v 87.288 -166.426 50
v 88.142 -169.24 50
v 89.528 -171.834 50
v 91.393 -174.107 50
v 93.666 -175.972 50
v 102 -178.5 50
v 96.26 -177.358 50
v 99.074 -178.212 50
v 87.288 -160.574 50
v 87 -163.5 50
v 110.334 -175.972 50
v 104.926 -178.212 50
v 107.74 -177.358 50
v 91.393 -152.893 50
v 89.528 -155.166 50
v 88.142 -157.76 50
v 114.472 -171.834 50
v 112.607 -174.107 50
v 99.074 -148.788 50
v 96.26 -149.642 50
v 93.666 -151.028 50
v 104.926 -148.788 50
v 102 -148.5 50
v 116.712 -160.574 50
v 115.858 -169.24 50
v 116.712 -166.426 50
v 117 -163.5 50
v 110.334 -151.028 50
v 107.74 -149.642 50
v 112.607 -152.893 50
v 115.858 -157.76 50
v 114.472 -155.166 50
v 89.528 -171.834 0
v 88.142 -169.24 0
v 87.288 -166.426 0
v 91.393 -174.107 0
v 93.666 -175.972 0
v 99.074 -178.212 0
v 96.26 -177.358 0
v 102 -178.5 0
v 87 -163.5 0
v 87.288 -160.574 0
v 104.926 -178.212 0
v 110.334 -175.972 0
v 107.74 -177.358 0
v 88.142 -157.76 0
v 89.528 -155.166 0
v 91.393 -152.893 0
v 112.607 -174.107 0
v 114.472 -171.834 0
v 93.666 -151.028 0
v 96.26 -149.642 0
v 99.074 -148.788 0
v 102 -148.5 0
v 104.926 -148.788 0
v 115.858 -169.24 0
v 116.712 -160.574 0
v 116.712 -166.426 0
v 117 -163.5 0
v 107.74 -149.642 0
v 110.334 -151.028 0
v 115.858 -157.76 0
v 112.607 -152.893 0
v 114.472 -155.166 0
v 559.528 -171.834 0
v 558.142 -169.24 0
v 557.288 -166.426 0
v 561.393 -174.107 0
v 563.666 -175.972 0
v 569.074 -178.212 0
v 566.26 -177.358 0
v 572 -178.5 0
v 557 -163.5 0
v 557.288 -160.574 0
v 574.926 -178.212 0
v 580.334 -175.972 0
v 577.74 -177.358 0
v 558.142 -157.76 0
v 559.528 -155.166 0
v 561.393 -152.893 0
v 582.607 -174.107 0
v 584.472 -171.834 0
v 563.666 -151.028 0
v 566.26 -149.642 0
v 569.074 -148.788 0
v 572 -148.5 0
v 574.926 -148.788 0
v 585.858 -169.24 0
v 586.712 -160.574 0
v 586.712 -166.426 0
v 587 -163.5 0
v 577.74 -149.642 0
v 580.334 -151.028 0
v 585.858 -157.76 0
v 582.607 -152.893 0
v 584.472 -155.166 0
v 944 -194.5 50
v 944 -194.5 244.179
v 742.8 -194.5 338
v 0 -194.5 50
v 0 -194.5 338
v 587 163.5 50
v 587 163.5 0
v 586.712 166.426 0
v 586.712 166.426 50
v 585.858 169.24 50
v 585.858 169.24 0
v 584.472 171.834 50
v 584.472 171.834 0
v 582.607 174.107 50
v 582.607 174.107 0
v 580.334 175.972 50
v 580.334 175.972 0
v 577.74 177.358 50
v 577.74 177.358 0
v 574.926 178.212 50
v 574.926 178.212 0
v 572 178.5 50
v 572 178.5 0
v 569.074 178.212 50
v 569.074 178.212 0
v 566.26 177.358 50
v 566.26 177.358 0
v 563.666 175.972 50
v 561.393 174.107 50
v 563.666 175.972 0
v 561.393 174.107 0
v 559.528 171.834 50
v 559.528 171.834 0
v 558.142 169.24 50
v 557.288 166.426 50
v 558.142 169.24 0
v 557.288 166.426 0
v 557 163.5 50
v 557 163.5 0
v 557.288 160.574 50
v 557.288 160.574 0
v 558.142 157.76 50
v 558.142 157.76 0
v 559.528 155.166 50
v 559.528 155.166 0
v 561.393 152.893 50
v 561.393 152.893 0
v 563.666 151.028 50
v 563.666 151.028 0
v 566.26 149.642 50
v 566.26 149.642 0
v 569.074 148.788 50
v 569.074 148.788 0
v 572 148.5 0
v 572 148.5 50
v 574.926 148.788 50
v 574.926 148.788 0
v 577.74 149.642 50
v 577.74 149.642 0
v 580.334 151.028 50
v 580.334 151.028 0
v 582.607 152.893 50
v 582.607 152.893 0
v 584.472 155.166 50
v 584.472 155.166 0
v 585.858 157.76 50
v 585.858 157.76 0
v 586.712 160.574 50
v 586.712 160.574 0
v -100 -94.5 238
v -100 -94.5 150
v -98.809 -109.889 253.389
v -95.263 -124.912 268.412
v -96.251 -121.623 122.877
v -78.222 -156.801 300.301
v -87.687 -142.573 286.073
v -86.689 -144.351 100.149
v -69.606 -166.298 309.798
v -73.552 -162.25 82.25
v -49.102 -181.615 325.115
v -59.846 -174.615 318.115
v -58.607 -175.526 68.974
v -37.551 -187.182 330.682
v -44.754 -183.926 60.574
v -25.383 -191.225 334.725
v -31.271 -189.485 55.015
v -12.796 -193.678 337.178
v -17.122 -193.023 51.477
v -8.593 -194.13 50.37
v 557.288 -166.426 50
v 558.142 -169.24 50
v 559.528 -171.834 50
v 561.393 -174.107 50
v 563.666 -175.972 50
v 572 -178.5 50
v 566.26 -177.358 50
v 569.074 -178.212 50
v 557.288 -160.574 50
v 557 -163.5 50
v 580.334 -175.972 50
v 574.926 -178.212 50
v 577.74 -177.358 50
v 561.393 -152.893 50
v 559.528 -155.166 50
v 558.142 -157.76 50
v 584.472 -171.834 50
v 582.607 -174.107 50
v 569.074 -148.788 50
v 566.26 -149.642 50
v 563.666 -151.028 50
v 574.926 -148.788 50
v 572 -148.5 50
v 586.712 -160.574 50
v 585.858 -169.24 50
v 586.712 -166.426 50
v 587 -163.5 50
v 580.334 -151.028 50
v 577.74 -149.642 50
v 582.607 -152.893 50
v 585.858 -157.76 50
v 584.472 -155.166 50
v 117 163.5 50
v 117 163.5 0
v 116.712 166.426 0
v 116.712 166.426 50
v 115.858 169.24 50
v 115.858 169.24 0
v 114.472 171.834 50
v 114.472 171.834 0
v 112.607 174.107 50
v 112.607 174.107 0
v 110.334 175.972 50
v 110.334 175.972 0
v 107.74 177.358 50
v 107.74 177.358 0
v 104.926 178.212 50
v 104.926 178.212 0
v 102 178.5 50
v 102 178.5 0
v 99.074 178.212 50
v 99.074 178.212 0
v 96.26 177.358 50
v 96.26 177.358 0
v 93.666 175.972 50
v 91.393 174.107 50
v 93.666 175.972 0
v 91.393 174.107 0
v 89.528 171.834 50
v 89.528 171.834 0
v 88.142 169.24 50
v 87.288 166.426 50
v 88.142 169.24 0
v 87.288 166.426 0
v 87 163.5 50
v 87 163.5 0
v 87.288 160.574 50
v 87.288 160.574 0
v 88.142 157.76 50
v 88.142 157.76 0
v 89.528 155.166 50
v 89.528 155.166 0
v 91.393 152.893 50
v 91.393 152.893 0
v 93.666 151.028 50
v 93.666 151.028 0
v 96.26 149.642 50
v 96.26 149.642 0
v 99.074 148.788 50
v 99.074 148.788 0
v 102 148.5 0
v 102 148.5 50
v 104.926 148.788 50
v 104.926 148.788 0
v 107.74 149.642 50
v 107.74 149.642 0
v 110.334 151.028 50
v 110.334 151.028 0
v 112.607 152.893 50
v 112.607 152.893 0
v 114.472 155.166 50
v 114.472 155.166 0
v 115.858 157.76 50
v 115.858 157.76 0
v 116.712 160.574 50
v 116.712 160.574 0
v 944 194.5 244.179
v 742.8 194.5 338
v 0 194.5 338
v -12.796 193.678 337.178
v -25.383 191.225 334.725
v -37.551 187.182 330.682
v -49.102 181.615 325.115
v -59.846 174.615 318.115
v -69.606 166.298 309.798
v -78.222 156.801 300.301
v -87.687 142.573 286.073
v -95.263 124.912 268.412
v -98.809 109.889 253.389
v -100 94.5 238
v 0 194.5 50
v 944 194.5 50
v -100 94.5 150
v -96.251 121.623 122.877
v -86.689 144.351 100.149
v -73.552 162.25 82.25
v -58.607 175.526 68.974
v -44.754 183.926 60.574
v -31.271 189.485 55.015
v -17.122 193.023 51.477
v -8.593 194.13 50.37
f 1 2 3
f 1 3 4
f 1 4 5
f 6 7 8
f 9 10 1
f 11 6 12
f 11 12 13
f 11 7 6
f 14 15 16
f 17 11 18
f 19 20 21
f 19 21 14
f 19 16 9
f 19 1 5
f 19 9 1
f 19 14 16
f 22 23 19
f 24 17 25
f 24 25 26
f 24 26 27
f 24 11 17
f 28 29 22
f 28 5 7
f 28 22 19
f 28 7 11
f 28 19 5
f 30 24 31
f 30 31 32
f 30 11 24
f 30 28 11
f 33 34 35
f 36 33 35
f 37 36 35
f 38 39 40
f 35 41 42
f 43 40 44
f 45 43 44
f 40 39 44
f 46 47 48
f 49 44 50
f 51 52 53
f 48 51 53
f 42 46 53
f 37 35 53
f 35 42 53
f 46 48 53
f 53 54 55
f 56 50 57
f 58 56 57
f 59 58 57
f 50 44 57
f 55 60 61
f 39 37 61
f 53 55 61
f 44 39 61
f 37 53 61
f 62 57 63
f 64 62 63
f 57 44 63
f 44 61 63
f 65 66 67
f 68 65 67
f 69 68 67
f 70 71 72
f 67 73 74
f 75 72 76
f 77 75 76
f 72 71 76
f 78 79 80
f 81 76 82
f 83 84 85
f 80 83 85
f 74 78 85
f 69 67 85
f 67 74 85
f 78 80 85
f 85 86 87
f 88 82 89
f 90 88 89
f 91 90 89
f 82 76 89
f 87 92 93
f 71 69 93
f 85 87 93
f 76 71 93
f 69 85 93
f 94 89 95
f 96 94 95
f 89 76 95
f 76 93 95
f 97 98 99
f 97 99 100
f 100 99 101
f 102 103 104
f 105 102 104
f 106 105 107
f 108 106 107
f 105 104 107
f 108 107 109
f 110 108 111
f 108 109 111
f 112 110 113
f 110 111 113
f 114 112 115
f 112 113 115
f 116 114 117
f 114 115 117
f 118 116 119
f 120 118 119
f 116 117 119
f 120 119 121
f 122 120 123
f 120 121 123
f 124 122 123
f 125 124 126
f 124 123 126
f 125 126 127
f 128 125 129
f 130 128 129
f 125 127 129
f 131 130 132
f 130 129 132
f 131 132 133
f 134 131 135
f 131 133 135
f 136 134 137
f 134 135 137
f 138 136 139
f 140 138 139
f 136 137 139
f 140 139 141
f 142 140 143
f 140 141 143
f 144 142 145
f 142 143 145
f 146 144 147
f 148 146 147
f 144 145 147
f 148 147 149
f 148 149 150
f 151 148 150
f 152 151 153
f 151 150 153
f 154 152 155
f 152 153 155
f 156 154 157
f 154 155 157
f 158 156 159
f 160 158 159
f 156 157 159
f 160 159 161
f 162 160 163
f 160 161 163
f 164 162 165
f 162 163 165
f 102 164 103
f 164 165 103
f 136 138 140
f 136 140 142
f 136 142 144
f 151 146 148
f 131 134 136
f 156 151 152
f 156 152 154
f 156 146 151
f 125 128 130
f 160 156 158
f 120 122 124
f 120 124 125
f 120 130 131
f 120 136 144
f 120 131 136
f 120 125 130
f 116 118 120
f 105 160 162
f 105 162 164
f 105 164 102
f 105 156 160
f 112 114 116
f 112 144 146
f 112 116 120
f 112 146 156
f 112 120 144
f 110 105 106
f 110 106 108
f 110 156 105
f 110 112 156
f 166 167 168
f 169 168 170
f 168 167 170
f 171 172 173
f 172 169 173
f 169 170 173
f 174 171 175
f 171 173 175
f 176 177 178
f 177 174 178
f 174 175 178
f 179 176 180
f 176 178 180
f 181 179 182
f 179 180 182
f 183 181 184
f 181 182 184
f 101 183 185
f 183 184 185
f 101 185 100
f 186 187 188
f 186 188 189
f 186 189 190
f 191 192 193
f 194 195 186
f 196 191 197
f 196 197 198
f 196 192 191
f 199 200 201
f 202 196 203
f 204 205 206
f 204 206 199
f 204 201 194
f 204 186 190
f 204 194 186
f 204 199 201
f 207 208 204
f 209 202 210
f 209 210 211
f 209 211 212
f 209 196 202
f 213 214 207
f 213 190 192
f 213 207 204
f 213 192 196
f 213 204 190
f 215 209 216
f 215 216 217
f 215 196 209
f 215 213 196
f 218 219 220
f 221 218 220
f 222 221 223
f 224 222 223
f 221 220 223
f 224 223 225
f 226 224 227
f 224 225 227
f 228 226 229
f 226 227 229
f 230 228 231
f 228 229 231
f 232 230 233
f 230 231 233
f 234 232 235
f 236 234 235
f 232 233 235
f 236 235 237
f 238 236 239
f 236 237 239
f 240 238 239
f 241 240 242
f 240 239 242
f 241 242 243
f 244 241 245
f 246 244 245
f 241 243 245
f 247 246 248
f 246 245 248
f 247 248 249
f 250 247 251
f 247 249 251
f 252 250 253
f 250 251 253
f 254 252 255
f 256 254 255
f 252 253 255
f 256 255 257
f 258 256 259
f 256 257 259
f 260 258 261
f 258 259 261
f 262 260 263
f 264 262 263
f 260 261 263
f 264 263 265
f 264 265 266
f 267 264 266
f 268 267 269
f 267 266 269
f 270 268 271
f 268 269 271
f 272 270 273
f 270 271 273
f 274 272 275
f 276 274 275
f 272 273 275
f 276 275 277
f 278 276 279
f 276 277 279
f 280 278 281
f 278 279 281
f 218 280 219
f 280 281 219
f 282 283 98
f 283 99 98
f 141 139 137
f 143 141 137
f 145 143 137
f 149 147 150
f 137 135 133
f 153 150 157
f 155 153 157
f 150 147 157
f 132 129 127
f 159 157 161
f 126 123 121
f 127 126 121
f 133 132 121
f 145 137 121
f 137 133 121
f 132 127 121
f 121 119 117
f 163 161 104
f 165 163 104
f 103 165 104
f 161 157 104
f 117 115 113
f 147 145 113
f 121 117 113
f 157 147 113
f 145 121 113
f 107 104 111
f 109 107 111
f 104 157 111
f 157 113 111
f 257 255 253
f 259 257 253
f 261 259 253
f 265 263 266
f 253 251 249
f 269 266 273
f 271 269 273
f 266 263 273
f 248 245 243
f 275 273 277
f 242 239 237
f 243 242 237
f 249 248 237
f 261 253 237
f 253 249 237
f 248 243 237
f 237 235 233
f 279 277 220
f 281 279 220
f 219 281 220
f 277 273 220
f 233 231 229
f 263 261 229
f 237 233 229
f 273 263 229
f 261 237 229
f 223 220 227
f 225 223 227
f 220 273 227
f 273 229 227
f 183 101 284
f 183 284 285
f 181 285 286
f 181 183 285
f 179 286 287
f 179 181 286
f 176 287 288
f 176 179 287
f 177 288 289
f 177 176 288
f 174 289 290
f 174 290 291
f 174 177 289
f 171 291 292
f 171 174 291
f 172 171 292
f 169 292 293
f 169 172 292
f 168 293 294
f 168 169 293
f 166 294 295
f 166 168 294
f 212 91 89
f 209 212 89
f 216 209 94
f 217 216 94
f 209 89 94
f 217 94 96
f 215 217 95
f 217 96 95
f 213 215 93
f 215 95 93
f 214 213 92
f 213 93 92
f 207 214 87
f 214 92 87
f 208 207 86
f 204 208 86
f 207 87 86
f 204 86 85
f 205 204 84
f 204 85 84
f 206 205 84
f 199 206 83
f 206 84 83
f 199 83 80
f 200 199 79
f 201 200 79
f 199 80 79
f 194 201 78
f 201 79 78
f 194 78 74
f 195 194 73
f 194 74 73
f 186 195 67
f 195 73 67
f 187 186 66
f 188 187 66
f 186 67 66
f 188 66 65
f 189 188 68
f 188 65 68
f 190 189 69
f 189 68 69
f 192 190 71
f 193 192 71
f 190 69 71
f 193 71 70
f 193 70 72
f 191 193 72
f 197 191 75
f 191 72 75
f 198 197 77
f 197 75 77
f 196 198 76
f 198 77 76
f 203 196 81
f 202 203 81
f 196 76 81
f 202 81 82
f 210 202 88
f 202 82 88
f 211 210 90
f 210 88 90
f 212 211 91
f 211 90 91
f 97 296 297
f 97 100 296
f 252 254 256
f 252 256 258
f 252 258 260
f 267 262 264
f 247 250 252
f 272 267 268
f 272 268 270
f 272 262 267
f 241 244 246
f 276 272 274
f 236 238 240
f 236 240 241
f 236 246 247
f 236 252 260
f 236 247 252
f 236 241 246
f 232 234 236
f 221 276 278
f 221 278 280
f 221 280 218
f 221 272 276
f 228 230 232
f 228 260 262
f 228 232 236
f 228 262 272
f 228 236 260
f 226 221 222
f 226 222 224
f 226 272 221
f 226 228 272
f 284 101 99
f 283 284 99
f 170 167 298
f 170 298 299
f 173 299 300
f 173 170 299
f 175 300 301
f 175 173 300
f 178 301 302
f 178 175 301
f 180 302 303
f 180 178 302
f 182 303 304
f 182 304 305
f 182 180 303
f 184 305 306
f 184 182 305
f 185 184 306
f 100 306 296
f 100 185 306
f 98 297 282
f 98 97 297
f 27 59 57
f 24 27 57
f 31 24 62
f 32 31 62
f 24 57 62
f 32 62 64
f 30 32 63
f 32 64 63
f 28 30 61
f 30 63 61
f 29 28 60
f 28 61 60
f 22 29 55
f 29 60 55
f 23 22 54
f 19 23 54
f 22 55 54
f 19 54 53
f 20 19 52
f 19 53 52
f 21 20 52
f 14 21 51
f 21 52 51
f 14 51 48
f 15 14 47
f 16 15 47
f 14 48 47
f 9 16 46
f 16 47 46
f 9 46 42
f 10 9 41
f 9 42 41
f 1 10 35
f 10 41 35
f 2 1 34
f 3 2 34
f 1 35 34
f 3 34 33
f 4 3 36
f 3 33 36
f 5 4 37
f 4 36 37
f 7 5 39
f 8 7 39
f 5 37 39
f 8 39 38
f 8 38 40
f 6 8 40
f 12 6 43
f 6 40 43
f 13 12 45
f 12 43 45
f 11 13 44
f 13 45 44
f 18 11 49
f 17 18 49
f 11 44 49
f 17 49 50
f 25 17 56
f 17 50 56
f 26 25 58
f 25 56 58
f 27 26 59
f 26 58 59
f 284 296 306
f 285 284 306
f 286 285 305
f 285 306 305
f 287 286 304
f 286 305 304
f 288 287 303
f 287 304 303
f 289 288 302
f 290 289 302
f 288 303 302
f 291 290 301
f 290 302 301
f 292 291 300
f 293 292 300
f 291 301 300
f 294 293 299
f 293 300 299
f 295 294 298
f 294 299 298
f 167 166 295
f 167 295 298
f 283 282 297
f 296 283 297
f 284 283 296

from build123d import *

# Parameters (mm, degrees)
PAD_DEPTH       = 194.5
POCKET_DEPTH    = 338.001
COPYSKETCH003_R = 15
PAD001_DEPTH    = 50
COPYSKETCH002_R = 15
PAD002_DEPTH    = 50
COPYSKETCH004_R = 15
PAD003_DEPTH    = 50
COPYSKETCH005_R = 15
PAD004_DEPTH    = 50


with BuildPart() as main_body:
    # Sketch → Pad (new body, symmetric)
    with BuildSketch(Plane.XZ):
        with BuildLine():
            Line((0, 338), (742.799671, 338))
            Line((742.799671, 338), (944, 244.178746))
            Line((944, 50), (944, 244.178746))
            Line((0, 50), (944, 50))
            ThreePointArc((-100, 150), (-70.710678, 79.289322), (0, 50))
            Line((-100, 238), (-100, 150))
            ThreePointArc((0, 338), (-70.710678, 308.710678), (-100, 238))
        make_face()
    extrude(amount=PAD_DEPTH, both=True)

    # Sketch001 → Pocket (cut, through all)
    with BuildSketch(Plane.XY):
        with BuildLine():
            ThreePointArc((0, 194.5), (-70.710678, 165.210678), (-100, 94.5))
            Line((-100, 94.5), (-100, -94.5))
            ThreePointArc((-100, -94.5), (-70.710678, -165.210678), (0, -194.5))
            Line((0, -244.5), (0, -194.5))
            Line((-150, -244.5), (0, -244.5))
            Line((-150, 244.5), (-150, -244.5))
            Line((0, 244.5), (-150, 244.5))
            Line((0, 194.5), (0, 244.5))
        make_face()
    extrude(amount=POCKET_DEPTH, mode=Mode.SUBTRACT)


with BuildPart() as support_fd001:
    # CopySketch003 → Pad001 (new body)
    with BuildSketch(Plane.XY):
        with Locations((102, -163.5)):
            Circle(COPYSKETCH003_R)
    extrude(amount=PAD001_DEPTH)


with BuildPart() as support_fp001:
    # CopySketch002 → Pad002 (new body)
    with BuildSketch(Plane.XY):
        with Locations((102, 163.5)):
            Circle(COPYSKETCH002_R)
    extrude(amount=PAD002_DEPTH)


with BuildPart() as support_rp001:
    # CopySketch004 → Pad003 (new body)
    with BuildSketch(Plane.XY):
        with Locations((572, 163.5)):
            Circle(COPYSKETCH004_R)
    extrude(amount=PAD003_DEPTH)


with BuildPart() as support_rd001:
    # CopySketch005 → Pad004 (new body)
    with BuildSketch(Plane.XY):
        with Locations((572, -163.5)):
            Circle(COPYSKETCH005_R)
    extrude(amount=PAD004_DEPTH)


solid = Compound([main_body.part, support_fd001.part, support_fp001.part, support_rp001.part, support_rd001.part])
